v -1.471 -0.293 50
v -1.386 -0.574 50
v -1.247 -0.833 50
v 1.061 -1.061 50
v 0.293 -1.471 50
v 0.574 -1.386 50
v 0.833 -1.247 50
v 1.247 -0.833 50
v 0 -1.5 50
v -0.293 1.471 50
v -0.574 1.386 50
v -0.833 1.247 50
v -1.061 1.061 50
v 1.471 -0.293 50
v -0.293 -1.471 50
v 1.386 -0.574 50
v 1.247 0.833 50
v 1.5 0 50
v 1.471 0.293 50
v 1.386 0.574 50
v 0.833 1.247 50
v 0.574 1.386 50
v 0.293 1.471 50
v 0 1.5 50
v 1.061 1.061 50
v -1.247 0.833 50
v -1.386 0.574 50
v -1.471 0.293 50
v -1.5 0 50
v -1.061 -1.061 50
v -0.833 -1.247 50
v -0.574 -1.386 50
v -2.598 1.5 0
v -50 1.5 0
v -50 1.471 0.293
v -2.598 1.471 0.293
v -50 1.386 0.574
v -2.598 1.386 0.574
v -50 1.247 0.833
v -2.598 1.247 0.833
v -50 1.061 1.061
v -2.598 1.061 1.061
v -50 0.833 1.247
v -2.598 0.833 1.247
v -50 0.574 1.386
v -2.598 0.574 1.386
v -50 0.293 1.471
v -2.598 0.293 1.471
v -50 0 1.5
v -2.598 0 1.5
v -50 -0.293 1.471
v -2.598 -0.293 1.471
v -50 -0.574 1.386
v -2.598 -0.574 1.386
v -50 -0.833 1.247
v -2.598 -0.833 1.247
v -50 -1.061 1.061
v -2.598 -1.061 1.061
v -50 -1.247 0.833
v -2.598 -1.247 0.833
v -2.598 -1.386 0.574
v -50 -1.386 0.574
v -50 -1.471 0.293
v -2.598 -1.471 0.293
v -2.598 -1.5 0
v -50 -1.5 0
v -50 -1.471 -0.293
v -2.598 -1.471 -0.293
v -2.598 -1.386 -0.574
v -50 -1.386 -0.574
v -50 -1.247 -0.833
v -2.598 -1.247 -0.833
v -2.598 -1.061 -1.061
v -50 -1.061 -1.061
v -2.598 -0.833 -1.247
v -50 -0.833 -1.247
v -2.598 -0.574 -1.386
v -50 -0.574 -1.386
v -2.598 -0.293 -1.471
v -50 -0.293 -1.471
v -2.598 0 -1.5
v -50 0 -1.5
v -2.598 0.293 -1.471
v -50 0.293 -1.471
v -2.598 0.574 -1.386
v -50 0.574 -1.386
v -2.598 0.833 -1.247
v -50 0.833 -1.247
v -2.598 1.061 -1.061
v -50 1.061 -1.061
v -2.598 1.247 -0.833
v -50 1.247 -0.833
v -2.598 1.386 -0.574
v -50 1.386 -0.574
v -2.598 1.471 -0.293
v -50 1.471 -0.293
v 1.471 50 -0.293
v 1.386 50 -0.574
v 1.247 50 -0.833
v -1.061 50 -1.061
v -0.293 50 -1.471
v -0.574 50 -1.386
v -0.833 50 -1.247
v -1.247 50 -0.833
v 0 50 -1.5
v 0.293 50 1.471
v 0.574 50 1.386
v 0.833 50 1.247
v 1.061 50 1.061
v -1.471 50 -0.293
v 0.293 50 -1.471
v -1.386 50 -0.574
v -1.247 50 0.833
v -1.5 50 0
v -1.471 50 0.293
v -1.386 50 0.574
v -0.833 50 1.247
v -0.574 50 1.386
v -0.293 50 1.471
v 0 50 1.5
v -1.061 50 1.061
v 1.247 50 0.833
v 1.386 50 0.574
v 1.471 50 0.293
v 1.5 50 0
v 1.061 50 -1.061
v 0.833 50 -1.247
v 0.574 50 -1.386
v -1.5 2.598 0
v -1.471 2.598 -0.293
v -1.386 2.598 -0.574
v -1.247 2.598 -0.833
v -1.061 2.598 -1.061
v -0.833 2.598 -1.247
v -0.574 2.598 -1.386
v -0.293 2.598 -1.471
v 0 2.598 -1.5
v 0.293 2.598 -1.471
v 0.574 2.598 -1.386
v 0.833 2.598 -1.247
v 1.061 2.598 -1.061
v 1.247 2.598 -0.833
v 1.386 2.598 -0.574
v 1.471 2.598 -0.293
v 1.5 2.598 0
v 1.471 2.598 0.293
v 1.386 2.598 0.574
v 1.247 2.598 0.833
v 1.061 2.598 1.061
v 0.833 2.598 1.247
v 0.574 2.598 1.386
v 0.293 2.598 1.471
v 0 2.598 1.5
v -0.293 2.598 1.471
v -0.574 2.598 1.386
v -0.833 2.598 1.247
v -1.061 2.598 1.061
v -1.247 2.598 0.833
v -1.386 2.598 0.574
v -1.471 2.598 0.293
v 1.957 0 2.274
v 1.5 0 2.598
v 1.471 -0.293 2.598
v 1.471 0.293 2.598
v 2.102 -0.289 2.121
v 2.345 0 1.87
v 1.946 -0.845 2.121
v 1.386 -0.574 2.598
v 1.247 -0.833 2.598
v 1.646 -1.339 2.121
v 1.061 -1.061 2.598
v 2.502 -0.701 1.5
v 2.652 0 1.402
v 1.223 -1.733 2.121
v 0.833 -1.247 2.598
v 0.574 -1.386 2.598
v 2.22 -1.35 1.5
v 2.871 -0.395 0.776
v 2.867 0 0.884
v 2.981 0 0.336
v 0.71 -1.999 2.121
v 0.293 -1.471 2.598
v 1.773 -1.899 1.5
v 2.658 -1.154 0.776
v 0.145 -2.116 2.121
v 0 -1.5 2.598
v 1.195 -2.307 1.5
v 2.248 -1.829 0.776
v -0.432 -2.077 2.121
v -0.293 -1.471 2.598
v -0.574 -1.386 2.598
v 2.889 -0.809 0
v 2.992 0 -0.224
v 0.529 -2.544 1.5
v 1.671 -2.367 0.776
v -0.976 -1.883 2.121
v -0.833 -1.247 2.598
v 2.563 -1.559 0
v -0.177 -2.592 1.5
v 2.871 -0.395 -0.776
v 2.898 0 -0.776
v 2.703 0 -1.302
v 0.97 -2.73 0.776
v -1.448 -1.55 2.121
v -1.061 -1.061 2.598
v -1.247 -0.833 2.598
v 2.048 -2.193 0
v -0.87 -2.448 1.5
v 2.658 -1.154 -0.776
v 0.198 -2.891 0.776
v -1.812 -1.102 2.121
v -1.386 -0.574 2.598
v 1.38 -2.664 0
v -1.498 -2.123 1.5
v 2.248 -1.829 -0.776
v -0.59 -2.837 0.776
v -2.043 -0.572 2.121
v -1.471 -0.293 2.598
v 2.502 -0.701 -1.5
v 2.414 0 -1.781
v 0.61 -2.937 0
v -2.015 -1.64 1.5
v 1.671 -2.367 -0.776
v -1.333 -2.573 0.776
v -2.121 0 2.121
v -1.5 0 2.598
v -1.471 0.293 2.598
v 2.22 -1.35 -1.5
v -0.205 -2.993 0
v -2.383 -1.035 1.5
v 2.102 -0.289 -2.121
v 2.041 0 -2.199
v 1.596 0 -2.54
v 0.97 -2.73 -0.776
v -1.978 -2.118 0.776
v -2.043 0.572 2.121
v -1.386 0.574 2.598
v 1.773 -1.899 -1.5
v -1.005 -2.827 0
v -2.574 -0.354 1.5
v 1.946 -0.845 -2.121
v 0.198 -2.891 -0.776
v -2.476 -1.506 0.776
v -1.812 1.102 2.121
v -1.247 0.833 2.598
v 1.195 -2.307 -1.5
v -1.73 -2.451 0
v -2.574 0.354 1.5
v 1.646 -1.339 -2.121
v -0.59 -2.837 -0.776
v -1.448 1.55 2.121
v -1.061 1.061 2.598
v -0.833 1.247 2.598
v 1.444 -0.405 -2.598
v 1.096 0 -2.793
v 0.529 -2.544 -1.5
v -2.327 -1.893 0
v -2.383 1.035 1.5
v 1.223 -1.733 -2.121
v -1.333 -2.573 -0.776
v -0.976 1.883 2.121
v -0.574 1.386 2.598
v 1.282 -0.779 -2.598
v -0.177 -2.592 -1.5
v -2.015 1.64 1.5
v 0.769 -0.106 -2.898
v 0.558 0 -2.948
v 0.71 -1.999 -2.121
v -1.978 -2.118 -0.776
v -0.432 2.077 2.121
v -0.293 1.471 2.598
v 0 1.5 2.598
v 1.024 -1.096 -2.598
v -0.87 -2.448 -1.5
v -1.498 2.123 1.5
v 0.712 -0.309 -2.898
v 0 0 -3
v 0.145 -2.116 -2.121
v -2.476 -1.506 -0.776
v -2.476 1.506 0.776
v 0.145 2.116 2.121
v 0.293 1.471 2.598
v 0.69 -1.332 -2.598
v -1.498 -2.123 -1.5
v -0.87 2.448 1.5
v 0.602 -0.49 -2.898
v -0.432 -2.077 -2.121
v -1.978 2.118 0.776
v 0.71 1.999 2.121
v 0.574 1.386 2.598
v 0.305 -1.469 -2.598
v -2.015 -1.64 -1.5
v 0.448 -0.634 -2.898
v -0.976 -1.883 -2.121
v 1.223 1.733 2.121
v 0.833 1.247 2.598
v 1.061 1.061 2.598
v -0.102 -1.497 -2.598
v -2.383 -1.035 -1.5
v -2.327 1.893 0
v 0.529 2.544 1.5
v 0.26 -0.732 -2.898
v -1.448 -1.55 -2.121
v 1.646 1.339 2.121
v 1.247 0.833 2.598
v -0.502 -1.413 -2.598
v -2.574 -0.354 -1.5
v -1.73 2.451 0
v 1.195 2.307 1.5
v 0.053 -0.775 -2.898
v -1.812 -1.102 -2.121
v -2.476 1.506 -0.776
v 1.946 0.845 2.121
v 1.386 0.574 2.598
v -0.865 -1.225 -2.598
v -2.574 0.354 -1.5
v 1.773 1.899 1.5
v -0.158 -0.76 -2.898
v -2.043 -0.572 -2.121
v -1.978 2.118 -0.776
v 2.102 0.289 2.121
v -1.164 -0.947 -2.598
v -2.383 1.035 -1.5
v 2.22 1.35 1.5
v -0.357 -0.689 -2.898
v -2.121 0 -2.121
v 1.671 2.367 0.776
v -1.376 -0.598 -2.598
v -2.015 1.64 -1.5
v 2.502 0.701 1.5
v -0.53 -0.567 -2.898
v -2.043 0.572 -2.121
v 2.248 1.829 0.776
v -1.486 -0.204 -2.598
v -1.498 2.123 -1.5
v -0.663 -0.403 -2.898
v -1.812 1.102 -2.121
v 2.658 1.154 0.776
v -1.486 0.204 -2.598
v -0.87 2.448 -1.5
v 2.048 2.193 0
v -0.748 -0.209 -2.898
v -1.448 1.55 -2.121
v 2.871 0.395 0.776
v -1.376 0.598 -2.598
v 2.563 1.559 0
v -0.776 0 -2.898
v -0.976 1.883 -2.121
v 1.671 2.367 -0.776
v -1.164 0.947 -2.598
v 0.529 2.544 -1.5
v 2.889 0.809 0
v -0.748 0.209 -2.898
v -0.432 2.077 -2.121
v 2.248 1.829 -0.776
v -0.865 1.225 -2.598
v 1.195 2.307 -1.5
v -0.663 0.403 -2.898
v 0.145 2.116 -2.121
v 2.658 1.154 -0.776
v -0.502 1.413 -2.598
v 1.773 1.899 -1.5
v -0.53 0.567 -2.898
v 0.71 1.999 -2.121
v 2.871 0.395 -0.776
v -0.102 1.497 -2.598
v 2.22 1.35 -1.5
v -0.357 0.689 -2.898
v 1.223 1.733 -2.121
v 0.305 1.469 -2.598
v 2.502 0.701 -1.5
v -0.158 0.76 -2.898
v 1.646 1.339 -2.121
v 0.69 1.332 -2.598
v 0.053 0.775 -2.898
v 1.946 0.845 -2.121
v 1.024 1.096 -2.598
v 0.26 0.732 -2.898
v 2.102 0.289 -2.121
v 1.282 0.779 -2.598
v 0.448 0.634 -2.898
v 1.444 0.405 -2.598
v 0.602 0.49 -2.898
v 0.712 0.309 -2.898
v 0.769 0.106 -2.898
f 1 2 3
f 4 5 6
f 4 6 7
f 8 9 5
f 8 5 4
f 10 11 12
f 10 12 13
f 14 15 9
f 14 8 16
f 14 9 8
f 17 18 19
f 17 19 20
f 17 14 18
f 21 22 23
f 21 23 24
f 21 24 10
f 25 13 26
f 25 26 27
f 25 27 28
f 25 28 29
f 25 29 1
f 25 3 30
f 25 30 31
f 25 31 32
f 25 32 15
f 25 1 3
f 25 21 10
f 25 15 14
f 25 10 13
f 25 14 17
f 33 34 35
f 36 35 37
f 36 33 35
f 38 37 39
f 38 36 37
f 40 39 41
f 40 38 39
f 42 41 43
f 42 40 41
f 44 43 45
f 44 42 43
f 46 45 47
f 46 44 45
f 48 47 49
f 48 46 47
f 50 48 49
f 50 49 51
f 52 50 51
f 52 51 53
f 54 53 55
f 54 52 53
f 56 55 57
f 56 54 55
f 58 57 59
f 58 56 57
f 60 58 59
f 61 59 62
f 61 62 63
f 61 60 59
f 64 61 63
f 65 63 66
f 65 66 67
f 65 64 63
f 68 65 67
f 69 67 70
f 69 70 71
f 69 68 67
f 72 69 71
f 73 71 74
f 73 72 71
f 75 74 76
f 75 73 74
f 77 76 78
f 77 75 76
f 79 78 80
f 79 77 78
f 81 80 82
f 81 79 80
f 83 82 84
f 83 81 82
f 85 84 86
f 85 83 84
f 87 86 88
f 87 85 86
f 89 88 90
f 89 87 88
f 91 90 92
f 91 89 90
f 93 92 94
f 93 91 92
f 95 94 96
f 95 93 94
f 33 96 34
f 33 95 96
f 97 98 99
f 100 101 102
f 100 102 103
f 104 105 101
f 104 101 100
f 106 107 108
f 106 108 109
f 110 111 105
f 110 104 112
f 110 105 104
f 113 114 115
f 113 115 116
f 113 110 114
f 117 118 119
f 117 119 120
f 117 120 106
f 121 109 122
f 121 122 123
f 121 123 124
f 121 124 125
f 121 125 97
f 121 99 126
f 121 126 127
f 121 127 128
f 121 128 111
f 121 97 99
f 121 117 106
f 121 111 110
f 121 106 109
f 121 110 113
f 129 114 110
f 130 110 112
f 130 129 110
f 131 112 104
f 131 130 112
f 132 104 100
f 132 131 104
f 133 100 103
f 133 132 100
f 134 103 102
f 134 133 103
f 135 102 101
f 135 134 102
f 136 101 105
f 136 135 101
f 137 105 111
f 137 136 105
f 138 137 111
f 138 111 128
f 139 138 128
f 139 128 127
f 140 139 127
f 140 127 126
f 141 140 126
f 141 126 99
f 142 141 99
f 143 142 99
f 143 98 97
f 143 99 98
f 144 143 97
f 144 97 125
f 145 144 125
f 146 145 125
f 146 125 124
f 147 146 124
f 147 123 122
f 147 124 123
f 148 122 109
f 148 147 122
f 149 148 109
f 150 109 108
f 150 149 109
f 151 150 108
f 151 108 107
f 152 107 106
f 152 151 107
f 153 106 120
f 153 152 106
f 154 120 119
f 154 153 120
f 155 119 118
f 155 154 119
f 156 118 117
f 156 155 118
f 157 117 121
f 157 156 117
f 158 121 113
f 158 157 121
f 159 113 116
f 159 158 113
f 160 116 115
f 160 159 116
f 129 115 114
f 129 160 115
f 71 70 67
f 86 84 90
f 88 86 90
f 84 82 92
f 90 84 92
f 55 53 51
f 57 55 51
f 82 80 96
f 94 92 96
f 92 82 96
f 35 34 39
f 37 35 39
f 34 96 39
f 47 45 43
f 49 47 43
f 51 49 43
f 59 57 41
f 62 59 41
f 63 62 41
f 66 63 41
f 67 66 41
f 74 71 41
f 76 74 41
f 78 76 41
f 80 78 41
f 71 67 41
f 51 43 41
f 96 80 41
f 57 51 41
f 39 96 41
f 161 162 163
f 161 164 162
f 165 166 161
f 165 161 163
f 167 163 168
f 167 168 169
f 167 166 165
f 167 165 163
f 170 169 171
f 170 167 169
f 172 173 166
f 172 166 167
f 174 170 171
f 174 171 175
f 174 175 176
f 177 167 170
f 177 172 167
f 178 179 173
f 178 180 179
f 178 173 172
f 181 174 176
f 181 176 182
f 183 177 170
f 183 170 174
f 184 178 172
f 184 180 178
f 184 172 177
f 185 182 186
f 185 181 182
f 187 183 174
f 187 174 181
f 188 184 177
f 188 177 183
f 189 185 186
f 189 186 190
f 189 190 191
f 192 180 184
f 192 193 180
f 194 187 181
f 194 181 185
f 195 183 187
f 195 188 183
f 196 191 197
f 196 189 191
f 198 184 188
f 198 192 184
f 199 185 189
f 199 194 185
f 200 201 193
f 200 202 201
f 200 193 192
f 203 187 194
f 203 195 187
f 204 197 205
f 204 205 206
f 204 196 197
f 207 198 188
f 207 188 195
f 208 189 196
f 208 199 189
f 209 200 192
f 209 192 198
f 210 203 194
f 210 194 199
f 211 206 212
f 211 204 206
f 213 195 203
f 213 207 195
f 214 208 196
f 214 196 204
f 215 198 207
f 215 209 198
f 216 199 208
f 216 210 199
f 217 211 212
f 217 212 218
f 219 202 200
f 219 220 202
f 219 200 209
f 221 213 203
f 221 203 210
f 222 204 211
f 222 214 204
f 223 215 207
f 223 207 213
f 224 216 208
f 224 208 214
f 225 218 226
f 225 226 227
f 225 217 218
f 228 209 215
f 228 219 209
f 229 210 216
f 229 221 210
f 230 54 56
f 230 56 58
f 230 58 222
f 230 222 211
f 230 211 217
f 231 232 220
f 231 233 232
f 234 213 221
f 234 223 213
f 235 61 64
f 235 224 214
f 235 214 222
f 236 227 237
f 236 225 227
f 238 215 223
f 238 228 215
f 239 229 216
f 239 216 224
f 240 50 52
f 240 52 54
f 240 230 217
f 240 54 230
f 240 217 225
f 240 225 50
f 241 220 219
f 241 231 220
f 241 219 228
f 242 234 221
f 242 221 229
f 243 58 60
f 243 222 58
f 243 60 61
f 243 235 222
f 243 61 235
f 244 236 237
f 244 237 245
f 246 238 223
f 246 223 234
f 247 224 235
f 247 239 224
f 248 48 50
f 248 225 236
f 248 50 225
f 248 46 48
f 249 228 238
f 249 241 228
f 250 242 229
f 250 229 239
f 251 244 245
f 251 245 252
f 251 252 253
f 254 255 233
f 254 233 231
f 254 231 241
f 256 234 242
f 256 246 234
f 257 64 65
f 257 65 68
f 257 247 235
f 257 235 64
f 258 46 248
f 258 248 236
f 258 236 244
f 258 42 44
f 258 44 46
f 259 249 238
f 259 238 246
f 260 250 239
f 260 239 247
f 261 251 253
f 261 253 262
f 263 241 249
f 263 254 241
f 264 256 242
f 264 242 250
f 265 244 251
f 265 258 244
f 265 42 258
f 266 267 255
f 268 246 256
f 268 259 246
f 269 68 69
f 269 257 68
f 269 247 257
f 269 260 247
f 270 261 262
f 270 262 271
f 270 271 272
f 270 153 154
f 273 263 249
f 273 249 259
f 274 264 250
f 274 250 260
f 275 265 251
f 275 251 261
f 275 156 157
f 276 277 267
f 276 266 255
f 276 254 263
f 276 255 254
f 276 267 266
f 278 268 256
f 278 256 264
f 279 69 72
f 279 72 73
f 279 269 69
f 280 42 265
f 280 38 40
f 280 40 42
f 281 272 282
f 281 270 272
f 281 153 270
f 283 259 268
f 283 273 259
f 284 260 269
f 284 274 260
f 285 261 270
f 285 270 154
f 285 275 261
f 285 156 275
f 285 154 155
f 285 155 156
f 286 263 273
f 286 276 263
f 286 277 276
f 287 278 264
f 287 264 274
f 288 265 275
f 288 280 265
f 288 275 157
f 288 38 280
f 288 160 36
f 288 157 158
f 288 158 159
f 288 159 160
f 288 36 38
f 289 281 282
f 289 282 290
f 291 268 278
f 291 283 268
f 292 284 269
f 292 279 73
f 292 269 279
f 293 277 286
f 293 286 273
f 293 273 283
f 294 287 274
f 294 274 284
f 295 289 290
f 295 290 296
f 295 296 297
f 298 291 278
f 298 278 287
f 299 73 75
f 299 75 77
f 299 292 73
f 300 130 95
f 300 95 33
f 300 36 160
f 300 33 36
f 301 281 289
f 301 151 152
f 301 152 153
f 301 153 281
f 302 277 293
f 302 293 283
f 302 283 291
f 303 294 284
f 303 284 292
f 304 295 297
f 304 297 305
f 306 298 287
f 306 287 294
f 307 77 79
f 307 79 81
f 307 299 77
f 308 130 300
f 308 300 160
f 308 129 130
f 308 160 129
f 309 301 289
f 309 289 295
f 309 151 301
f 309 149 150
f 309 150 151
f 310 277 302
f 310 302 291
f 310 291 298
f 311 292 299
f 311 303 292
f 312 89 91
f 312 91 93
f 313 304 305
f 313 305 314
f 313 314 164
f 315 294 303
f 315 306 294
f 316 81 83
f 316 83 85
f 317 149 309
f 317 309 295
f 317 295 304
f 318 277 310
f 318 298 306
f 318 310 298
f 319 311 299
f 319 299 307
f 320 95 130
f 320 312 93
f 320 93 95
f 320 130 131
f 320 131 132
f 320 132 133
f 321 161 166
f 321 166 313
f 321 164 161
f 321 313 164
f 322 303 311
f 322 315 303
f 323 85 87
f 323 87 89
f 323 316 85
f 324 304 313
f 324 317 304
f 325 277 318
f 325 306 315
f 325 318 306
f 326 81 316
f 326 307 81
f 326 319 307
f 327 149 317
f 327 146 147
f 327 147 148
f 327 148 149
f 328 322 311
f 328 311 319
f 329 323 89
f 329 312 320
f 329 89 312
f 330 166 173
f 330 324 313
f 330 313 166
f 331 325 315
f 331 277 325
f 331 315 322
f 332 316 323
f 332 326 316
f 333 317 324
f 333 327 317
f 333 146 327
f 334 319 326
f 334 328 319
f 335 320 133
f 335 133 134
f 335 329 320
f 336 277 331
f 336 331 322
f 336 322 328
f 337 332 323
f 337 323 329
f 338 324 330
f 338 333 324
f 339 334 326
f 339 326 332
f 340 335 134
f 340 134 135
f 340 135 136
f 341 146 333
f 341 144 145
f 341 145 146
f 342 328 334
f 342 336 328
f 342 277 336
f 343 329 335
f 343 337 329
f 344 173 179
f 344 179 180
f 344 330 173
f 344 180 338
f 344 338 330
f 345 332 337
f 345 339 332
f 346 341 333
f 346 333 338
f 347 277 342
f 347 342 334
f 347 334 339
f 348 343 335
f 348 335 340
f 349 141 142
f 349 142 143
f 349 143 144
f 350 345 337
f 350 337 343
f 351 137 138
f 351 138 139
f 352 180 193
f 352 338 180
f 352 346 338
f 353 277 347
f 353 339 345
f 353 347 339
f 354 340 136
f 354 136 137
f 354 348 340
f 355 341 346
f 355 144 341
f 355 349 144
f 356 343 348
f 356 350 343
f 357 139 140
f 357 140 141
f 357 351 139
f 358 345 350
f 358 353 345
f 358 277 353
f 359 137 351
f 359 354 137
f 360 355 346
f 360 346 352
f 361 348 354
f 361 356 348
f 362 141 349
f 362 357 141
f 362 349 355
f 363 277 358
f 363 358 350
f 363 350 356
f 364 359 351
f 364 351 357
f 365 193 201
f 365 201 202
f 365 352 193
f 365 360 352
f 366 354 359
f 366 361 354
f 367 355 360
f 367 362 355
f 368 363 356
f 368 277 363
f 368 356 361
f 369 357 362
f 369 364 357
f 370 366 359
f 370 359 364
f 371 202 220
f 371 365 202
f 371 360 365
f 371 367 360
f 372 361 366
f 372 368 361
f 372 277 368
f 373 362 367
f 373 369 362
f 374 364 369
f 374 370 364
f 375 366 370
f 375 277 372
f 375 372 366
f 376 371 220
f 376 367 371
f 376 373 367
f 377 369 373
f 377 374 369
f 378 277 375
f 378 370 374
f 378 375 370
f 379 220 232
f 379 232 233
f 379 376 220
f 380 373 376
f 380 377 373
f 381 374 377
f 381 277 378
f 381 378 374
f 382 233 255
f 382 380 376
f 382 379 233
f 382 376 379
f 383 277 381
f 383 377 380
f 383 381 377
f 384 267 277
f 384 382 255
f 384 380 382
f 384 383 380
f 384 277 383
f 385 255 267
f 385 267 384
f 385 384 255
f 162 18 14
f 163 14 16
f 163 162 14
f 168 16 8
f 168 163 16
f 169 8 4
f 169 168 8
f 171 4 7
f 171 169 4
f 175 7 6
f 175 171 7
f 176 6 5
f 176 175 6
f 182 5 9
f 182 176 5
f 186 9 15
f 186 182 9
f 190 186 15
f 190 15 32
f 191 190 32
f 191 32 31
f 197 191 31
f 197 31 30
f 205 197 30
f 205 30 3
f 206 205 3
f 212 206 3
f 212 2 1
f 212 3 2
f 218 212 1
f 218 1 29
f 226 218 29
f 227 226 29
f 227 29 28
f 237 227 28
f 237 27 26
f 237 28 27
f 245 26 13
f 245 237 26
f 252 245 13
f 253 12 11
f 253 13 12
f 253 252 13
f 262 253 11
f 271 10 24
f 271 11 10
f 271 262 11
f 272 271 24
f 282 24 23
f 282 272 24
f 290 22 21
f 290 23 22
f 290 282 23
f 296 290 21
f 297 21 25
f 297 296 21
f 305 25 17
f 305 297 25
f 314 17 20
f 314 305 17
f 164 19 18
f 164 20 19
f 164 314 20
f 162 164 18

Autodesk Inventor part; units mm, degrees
ref_plane "YZ Plane" through (0, 0, 0) normal (1, 0, 0) x (0, 1, 0)
ref_plane "XZ Plane" through (0, 0, 0) normal (0, 1, 0) x (-1, 0, 0)
ref_plane "XY Plane" through (0, 0, 0) normal (0, 0, 1) x (1, 0, 0)
sketch "스케치1" plane through (0, 0, 0) normal (0, 1, 0) x (-1, 0, 0)
  circle A0 centre (0, 0) radius 1.5
  dimension "d0" = 3
extrude "돌출1" add sketch "스케치1" along normal blind 50
sketch "스케치2" plane through (0, 0, 0) normal (0, 1, 0) x (-1, 0, 0)
  arc A0 (0, 3) -> (0, -3) centre (0, 0) ccw
  line L0 (0, 3) -> (0, -3)
  line L1 (0, -7) -> (0, 7) projected
  dimension "d3" = 6
revolve "회전1" add sketch "스케치2" angle 360 about axis through (0, 0, -10) along (0, 0, 1)
sketch "스케치3" plane through (0, 0, 0) normal (0, 0, 1) x (1, 0, 0)
  circle A0 centre (0, 0) radius 1.5
  dimension "d5" = 3
extrude "돌출2" add sketch "스케치3" along normal blind 50
sketch "스케치4" plane through (0, 0, 0) normal (1, 0, 0) x (0, 1, 0)
  circle A0 centre (0, 0) radius 1.5
  dimension "d8" = 3
extrude "돌출3" add sketch "스케치4" against normal blind 50
properties part number "arrows2"
